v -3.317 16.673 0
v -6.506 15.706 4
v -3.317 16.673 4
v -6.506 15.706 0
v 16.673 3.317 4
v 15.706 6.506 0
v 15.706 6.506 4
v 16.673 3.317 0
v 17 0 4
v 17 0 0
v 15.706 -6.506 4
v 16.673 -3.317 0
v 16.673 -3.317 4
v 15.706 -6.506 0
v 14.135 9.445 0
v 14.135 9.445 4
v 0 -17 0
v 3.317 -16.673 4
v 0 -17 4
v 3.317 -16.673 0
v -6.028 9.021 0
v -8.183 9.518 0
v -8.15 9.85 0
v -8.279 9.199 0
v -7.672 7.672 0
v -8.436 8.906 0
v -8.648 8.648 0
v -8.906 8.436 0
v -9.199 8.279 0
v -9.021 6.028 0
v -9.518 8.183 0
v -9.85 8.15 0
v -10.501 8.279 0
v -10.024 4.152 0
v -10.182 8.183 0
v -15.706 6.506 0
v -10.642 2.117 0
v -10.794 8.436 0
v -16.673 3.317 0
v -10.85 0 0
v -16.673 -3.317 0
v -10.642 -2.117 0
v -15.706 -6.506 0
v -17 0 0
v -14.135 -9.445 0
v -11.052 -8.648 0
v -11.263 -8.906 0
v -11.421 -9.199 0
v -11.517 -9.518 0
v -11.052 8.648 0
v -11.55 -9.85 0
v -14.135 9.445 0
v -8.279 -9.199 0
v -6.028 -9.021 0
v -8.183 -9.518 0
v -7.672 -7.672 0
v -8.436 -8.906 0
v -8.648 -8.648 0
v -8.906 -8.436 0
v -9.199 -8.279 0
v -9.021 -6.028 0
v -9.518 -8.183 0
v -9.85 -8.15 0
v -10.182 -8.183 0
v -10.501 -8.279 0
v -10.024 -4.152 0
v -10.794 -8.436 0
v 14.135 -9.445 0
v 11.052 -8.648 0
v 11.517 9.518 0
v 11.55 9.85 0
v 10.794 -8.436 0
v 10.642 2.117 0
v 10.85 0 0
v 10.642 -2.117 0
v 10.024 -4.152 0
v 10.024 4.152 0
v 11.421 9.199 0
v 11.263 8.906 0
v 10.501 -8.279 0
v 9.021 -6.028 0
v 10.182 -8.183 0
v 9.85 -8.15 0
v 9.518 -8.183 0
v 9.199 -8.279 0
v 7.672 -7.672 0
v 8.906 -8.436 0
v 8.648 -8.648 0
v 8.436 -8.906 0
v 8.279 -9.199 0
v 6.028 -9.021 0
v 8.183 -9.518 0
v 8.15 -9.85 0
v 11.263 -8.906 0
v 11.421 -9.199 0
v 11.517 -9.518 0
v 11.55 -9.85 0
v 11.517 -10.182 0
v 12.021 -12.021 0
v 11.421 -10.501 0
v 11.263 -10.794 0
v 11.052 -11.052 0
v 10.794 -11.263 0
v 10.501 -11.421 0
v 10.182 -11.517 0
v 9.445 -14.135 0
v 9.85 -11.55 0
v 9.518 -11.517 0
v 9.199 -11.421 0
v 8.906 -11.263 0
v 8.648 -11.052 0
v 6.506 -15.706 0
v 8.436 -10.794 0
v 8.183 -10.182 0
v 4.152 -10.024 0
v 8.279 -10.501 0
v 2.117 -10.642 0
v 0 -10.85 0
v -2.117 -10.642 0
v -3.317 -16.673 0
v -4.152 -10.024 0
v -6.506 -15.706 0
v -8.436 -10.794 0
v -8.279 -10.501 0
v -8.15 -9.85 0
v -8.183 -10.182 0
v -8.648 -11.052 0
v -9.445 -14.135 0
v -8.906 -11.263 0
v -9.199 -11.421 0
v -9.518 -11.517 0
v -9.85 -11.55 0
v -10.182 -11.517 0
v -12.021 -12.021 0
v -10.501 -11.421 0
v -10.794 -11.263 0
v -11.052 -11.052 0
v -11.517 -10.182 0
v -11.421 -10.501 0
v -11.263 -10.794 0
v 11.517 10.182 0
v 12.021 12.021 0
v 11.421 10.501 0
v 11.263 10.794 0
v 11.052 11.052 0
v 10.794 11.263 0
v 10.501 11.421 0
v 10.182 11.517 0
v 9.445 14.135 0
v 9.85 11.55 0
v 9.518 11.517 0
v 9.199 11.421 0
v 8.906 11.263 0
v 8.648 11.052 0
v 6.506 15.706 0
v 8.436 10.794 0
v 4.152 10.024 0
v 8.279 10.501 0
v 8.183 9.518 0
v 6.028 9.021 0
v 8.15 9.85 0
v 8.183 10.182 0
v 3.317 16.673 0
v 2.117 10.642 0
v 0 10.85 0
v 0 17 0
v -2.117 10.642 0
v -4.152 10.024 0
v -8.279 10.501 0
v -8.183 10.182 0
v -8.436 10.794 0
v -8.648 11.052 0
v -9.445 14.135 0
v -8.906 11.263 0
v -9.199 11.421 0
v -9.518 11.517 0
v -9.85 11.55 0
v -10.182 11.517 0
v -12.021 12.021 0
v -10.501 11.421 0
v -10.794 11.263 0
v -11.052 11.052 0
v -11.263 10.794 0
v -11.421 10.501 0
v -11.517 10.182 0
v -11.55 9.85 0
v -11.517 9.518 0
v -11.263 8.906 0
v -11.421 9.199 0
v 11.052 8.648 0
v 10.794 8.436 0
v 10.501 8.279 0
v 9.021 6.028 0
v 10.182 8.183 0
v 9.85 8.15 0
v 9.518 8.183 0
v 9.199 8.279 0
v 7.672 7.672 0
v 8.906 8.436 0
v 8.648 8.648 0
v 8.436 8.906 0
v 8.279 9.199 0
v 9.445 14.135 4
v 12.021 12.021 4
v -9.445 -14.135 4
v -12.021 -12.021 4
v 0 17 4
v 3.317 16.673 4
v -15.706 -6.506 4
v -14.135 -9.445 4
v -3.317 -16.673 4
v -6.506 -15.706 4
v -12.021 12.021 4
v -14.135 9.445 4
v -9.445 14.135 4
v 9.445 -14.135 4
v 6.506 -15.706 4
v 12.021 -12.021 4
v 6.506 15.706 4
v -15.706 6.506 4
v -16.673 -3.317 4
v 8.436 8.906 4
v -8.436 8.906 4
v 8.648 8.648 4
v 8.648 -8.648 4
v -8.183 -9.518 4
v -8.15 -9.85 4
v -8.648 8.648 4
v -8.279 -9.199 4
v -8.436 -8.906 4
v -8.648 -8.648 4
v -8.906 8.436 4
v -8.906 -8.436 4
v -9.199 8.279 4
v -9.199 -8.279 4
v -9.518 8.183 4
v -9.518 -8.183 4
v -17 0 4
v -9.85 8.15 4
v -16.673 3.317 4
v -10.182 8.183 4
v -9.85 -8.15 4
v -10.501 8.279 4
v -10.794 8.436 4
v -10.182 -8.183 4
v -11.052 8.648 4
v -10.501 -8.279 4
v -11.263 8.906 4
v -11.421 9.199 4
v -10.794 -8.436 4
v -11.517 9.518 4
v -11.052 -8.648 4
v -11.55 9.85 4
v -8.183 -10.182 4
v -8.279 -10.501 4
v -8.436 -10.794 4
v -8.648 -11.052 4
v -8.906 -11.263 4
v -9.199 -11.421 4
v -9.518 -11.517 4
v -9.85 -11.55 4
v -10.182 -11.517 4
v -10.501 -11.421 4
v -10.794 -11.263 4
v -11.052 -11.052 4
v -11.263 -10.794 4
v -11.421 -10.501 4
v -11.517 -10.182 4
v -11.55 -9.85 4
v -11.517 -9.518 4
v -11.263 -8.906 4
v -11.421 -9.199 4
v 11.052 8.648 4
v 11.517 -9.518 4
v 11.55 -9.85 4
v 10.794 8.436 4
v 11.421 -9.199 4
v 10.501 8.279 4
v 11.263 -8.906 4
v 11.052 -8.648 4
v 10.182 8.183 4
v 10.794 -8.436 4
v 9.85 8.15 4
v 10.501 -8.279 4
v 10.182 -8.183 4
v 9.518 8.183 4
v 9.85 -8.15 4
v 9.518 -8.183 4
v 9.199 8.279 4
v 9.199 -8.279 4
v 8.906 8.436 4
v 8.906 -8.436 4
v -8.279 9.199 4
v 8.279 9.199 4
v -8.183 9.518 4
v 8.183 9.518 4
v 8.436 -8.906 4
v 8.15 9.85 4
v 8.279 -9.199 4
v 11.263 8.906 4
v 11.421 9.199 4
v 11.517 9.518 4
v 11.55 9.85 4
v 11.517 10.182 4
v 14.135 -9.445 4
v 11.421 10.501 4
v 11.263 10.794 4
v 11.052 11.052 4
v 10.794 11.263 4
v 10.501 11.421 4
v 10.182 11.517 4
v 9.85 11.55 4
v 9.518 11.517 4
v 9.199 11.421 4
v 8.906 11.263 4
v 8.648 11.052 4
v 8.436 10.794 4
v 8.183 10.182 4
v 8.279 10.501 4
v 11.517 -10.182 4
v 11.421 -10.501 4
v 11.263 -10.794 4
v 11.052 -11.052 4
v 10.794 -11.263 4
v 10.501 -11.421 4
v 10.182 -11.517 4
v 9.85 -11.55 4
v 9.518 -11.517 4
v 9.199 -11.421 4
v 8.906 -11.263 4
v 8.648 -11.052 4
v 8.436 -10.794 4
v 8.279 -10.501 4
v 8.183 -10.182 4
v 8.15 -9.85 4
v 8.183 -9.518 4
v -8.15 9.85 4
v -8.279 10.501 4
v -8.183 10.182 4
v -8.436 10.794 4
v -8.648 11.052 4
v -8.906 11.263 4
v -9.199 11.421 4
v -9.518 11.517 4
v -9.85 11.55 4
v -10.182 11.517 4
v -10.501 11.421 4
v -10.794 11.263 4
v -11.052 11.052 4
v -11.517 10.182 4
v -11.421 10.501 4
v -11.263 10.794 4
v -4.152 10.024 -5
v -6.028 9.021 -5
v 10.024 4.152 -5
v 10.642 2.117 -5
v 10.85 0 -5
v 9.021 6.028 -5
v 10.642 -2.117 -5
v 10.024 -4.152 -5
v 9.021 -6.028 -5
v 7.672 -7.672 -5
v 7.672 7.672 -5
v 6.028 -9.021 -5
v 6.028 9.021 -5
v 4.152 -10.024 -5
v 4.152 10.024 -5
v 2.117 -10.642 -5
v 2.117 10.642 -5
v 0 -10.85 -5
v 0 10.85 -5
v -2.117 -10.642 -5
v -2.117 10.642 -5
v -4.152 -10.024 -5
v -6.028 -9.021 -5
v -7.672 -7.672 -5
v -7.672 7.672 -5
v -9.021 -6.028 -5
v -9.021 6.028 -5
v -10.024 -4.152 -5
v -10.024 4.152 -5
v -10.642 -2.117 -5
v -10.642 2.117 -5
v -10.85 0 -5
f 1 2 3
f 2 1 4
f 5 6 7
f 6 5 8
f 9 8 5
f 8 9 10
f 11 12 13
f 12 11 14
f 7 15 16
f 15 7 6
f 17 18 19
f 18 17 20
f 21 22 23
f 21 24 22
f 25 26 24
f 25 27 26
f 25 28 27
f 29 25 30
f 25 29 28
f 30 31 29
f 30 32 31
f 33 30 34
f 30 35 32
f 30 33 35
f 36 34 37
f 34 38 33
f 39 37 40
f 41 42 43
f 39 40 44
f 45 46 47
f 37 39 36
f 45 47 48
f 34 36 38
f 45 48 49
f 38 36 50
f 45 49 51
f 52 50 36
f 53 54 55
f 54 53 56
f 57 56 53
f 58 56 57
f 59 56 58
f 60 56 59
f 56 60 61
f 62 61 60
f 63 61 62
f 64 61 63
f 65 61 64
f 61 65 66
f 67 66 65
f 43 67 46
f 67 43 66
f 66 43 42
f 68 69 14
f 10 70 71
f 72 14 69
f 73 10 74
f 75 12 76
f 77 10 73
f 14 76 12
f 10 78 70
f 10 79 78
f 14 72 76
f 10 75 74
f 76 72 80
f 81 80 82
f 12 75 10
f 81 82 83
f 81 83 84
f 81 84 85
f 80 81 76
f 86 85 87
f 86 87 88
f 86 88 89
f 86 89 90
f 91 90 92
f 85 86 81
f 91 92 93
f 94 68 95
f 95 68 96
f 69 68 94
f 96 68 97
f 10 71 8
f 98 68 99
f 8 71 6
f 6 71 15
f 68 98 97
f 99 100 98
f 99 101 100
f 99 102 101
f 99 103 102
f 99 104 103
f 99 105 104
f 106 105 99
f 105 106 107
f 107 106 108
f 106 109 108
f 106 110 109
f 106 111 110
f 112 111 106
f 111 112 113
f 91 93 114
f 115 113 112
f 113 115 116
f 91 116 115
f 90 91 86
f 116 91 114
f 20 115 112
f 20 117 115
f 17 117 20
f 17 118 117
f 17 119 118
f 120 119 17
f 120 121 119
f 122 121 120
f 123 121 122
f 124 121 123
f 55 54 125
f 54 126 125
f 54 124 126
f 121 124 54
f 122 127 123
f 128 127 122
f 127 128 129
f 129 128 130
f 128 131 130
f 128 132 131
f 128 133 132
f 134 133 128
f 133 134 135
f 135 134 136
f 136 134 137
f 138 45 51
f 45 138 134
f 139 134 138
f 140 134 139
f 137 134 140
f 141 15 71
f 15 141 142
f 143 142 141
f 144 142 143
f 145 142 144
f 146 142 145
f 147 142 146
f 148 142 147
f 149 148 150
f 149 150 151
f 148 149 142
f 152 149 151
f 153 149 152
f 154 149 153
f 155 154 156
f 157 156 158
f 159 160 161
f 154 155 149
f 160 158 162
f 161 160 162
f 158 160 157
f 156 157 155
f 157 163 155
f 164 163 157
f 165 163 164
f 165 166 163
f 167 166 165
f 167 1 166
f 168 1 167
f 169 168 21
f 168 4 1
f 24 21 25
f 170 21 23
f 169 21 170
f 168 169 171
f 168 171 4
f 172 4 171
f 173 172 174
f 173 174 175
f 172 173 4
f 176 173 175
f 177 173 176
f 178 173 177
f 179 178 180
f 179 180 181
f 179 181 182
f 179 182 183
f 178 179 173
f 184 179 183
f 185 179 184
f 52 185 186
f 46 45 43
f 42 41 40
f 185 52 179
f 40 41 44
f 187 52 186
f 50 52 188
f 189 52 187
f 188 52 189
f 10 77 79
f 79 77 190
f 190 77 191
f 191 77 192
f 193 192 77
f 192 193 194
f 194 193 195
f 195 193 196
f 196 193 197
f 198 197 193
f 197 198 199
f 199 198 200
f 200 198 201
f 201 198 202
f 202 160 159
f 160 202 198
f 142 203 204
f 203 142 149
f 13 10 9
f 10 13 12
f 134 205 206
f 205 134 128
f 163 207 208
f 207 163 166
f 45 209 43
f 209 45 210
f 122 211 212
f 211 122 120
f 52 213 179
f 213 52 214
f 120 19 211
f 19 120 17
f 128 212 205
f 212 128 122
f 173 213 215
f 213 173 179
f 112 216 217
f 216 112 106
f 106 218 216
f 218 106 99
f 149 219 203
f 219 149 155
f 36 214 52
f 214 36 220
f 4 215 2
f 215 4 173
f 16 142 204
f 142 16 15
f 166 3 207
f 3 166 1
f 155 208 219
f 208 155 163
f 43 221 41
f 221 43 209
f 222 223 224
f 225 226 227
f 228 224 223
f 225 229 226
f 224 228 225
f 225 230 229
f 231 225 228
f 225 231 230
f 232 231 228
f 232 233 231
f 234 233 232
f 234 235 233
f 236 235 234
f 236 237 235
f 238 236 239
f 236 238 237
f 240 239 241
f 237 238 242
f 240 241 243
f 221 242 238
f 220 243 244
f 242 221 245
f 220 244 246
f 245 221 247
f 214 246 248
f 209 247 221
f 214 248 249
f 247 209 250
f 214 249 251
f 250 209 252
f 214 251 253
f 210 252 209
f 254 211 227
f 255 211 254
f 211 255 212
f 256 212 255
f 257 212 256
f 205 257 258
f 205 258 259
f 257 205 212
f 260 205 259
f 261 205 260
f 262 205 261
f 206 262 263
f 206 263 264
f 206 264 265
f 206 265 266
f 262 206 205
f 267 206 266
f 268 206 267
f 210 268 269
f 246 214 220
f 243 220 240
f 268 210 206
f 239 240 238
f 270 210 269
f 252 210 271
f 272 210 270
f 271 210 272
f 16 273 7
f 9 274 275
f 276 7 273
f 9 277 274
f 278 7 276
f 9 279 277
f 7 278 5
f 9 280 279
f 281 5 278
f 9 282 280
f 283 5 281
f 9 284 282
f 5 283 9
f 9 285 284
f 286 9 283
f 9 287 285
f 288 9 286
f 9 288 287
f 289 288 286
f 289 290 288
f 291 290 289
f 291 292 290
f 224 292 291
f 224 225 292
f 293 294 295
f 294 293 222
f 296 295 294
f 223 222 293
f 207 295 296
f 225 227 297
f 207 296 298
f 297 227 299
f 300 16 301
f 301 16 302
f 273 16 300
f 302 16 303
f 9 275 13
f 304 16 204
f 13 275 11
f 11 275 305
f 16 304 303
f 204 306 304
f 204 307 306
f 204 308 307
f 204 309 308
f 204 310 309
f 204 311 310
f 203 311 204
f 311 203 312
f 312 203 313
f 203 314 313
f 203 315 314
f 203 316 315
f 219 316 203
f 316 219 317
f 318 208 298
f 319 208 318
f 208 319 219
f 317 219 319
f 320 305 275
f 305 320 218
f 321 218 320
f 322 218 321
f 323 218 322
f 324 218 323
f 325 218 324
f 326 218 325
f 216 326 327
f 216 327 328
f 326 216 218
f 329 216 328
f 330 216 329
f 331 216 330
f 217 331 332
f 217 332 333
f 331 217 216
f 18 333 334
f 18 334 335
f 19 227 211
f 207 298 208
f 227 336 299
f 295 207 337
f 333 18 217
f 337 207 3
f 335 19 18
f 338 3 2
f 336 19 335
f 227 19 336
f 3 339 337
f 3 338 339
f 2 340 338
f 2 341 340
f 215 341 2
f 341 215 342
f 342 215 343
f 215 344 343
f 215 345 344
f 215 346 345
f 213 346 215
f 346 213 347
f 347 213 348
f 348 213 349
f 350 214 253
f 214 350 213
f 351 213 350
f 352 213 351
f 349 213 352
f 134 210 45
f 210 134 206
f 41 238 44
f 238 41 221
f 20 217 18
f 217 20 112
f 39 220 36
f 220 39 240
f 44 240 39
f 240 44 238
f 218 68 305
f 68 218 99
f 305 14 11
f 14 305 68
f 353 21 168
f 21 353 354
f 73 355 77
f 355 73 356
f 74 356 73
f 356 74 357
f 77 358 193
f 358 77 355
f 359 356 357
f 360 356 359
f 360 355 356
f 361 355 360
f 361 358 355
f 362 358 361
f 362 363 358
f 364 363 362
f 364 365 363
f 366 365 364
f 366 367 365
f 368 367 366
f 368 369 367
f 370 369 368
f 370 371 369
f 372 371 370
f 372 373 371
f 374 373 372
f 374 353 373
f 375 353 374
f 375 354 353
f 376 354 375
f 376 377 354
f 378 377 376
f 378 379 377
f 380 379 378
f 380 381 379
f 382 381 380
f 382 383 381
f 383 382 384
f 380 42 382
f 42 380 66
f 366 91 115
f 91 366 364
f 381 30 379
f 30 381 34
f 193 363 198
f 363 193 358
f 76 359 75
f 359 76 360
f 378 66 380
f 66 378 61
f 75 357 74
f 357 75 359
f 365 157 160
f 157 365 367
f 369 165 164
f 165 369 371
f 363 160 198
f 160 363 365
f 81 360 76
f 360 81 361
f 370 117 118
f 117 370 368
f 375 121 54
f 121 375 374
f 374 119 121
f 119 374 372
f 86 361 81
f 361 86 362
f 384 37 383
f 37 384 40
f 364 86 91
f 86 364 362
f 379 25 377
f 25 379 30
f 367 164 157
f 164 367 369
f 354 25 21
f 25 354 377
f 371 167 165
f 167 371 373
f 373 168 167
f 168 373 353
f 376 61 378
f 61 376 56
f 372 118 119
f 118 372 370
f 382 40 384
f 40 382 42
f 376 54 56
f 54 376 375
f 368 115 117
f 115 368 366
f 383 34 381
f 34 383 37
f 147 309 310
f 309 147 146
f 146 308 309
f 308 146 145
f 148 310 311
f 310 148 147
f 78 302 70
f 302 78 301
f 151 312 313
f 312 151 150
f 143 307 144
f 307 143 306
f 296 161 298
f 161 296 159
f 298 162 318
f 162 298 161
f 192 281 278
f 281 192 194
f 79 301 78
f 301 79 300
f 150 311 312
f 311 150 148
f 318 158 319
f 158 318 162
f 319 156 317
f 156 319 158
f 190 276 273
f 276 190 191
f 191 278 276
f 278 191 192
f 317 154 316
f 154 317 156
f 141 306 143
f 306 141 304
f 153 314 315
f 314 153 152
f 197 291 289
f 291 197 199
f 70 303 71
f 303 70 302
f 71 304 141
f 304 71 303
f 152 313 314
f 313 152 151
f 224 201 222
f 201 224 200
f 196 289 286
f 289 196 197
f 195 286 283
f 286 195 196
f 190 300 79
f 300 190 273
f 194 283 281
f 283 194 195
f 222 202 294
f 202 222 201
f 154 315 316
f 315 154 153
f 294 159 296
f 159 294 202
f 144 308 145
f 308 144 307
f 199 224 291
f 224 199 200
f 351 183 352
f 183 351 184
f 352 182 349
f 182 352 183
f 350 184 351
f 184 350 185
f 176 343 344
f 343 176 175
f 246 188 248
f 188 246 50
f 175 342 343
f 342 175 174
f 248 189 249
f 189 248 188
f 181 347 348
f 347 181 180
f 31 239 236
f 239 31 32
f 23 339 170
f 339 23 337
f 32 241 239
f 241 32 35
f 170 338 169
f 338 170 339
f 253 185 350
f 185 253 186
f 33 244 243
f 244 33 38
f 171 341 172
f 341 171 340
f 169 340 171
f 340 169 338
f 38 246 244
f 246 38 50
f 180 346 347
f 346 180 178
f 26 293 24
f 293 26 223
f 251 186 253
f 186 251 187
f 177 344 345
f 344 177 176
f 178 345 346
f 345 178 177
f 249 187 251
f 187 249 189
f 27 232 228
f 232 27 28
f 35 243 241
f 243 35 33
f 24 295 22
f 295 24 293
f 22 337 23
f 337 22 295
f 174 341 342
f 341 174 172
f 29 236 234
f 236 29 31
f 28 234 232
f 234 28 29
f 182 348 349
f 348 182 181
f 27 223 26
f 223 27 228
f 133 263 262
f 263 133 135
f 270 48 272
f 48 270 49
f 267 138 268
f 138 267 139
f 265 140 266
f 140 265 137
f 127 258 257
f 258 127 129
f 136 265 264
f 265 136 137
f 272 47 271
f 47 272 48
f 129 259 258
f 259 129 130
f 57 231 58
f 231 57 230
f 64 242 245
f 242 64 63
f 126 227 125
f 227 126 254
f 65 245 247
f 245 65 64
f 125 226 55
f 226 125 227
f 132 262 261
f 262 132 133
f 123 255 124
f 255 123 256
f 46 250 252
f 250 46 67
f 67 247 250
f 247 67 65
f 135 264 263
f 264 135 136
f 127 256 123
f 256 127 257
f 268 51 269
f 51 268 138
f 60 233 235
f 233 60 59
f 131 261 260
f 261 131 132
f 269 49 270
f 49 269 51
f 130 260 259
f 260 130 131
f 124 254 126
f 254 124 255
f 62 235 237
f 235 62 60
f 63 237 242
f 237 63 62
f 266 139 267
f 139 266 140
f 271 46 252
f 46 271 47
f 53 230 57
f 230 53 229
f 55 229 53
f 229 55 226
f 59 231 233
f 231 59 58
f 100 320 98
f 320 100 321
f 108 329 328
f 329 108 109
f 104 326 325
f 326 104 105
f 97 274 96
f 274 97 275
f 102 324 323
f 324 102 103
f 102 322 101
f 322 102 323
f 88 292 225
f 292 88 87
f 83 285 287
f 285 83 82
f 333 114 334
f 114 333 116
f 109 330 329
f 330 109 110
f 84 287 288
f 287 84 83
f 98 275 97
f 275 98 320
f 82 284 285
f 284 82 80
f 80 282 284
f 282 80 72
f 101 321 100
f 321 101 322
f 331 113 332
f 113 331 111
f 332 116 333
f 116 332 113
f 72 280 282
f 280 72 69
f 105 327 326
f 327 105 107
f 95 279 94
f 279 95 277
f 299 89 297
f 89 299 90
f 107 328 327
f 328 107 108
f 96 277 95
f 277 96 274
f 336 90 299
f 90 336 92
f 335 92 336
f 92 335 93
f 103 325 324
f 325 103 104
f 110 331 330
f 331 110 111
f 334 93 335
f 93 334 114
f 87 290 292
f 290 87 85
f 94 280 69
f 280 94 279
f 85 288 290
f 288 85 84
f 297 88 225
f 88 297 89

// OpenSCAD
$fn = 32;

// ----------------------------------------------------------------------
// Retaining cap: 608 cover, 34 mm, spigot 21.7 mm
// ----------------------------------------------------------------------

// --- parameters (mm) ---
plate_d = 34;             // cover diameter
plate_t = 4;              // cover thickness
boss_d = 21.7;            // spigot that enters the housing
boss_h = 5;               // spigot height
bolt_d = 3.4;             // bolt clearance
bolt_r = 13.93;           // bolt circle radius

module cover() {
  cylinder(h = plate_t, d = plate_d);
}

module spigot() {
  /* sunk 1 mm into the cover; the spigot sets the overall height */
  translate([0, 0, -boss_h]) cylinder(h = boss_h + 1, d = boss_d);
}

difference() {
  union() {
    cover();
    spigot();
  }
  for (i = [0 : 3]) rotate([0, 0, 45 + i * 90]) translate([bolt_r, 0, -boss_h - 1])
    cylinder(h = boss_h + plate_t + 2, d = bolt_d);
}
